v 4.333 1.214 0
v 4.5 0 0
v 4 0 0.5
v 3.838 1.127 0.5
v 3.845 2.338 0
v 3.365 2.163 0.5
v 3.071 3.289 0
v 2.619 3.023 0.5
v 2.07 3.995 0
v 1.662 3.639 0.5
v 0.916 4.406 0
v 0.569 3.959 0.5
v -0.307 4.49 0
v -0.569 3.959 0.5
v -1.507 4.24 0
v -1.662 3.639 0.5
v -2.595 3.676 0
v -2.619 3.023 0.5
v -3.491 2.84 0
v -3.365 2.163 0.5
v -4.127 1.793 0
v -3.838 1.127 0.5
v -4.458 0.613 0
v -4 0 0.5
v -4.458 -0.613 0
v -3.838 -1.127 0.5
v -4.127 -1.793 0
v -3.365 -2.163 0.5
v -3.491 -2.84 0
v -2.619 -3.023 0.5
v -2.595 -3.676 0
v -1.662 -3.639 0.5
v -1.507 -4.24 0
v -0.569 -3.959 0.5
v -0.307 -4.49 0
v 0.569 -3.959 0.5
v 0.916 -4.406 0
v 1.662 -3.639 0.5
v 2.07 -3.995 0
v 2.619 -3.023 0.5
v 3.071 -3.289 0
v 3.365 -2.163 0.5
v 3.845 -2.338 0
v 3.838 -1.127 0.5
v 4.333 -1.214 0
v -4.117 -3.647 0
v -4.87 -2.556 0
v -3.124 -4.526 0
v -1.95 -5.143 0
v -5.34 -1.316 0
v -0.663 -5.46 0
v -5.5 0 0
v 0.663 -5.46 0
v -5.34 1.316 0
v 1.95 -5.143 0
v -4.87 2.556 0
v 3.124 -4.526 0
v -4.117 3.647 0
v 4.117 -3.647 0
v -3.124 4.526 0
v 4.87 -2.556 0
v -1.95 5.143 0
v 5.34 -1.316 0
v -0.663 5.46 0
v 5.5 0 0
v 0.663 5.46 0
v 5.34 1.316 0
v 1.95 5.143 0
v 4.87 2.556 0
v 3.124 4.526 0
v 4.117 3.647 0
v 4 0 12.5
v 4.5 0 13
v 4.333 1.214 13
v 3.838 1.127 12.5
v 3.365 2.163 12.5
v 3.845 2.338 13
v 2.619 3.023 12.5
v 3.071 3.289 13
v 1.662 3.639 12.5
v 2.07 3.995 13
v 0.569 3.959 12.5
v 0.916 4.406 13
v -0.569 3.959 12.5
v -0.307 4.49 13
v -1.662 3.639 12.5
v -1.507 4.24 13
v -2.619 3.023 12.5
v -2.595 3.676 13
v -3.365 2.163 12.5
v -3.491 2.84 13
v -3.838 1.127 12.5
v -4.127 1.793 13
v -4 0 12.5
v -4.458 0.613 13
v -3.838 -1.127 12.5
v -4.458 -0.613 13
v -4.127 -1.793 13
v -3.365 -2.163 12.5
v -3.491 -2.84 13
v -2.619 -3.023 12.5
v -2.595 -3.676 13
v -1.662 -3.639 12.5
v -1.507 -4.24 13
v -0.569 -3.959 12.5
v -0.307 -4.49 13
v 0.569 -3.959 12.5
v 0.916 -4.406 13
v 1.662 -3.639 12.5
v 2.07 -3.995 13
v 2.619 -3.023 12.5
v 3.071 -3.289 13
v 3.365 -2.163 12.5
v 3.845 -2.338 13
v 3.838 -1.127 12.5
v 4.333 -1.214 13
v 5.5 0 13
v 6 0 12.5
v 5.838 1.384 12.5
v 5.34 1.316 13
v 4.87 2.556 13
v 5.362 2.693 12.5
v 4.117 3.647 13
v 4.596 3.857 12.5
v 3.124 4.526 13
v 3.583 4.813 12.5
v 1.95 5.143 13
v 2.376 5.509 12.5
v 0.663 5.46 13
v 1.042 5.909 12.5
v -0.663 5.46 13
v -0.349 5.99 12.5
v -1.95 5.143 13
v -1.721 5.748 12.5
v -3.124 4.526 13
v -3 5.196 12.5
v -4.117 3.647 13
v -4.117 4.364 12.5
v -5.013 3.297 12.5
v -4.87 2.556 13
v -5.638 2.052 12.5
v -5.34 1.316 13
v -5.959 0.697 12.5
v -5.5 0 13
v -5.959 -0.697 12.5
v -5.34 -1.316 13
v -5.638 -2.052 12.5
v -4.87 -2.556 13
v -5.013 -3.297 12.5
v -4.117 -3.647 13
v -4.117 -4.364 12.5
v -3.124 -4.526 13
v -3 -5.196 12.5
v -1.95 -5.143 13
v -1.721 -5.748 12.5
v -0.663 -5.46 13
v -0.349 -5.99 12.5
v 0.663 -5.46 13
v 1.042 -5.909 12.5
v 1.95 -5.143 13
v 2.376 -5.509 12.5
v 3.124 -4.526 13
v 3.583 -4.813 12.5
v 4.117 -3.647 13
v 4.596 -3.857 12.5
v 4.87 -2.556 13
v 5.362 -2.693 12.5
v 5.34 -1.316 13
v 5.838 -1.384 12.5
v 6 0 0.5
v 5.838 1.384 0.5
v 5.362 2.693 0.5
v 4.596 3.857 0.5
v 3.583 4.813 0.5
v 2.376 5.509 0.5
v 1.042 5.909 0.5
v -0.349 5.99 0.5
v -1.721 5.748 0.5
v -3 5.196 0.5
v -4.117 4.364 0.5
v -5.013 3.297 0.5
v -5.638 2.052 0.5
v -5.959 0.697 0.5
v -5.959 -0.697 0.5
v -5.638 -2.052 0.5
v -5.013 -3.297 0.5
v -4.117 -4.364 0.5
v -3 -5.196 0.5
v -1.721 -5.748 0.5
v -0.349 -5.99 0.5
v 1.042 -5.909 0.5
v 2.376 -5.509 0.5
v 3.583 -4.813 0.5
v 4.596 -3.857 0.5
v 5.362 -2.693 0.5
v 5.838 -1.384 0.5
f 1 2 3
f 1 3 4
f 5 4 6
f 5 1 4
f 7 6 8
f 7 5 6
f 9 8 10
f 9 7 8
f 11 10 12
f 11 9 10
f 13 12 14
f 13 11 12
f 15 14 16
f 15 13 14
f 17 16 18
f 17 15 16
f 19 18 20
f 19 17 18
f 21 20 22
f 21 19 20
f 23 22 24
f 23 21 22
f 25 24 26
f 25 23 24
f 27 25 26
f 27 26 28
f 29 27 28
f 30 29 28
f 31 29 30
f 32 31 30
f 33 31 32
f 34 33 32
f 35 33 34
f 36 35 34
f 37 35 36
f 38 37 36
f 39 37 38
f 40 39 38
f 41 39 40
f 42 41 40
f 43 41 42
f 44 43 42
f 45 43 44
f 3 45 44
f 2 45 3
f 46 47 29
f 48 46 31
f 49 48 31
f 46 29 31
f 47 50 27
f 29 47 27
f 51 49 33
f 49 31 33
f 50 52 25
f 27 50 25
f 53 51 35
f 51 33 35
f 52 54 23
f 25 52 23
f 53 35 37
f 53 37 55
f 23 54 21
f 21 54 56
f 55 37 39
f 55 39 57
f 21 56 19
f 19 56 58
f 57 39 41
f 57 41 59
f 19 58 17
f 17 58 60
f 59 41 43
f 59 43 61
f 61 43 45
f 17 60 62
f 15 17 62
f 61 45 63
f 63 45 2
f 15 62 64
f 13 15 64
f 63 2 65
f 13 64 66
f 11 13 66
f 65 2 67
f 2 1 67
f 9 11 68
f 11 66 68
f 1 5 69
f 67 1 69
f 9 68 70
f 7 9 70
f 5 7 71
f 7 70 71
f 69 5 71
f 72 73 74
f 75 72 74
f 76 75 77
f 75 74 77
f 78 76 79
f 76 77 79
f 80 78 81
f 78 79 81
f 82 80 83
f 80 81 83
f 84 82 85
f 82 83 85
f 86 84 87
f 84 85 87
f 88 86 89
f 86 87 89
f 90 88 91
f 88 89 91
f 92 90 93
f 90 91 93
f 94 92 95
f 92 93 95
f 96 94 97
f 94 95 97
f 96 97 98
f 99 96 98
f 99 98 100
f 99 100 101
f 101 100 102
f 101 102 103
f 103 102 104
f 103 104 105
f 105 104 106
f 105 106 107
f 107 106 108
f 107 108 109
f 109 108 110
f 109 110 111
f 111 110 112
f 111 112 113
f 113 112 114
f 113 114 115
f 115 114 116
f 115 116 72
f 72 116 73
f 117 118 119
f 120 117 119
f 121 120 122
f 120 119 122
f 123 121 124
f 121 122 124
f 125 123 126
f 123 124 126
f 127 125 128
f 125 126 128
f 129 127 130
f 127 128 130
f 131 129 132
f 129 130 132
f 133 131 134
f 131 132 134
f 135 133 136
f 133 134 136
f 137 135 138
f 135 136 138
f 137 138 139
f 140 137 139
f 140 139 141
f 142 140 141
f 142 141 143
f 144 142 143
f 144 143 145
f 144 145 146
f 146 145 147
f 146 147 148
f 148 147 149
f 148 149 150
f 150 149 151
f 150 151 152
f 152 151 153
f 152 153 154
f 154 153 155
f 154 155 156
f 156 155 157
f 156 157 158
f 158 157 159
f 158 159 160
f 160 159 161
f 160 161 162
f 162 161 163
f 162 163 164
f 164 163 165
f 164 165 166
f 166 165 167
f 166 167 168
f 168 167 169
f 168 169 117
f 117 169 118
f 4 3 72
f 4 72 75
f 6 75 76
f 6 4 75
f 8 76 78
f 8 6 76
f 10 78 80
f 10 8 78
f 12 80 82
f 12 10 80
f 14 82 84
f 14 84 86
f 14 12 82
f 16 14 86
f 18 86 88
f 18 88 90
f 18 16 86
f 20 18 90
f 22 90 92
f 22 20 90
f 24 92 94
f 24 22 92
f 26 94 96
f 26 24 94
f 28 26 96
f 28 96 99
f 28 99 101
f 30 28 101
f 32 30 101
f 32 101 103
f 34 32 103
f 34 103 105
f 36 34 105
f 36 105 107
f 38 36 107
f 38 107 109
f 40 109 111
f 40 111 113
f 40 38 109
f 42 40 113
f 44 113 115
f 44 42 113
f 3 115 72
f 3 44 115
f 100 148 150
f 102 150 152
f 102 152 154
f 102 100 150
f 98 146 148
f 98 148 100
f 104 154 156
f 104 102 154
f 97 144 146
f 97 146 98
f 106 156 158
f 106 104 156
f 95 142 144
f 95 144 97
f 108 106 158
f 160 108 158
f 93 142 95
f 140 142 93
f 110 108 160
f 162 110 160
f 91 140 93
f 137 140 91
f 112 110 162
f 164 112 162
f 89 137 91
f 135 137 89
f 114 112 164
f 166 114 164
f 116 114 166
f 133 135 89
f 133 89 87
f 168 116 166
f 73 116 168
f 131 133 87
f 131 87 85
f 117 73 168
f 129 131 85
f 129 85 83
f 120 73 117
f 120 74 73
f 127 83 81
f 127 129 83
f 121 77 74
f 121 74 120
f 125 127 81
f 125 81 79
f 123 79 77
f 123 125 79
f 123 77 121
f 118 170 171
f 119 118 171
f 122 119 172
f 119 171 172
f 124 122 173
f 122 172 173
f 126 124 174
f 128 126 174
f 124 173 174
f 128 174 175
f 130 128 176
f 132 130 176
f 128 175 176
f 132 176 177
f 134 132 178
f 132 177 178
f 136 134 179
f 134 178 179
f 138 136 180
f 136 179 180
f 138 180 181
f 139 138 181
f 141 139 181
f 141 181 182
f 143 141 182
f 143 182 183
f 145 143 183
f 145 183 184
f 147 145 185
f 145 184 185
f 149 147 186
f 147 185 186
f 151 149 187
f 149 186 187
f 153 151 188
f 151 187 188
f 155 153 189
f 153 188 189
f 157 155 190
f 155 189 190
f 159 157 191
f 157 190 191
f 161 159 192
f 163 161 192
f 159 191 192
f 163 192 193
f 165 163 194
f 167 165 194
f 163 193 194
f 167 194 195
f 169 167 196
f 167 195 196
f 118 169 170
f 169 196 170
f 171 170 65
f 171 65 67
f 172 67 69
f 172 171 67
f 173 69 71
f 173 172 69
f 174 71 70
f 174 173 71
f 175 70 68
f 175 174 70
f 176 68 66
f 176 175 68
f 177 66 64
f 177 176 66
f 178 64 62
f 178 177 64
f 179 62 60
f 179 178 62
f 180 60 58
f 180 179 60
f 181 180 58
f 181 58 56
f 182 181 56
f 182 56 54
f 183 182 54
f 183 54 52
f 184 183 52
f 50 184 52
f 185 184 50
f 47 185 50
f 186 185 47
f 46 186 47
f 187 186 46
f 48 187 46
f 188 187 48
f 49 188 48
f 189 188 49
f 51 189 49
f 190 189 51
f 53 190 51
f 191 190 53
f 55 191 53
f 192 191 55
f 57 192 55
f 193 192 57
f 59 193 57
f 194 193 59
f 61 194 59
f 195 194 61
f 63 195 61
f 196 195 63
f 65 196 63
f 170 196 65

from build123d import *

# Parameters (mm, degrees)
F0_R     = 6
F0_R_2   = 4
F1_DEPTH = 13
F2_SIZE  = 0.5
F3_SIZE  = 0.5
F4_SIZE  = 0.5


with BuildPart() as f1:
    # F0 (on Top) → F1 (new body)
    with BuildSketch(Plane.XY):
        Circle(F0_R)
        Circle(F0_R_2, mode=Mode.SUBTRACT)
    extrude(amount=F1_DEPTH)

    # F2
    f2_edges = [f1.edges().sort_by_distance(p)[0] for p in [
        (-4, 0, 13),
    ]]
    chamfer(f2_edges, length=F2_SIZE)

    # F3
    f3_edges = [f1.edges().sort_by_distance(p)[0] for p in [
        (-4, 0, 0),
    ]]
    chamfer(f3_edges, length=F3_SIZE)

    # F4
    f4_edges = [f1.edges().sort_by_distance(p)[0] for p in [
        (-6, 0, 0),
        (-6, 0, 13),
    ]]
    chamfer(f4_edges, length=F4_SIZE)


solid = f1.part
